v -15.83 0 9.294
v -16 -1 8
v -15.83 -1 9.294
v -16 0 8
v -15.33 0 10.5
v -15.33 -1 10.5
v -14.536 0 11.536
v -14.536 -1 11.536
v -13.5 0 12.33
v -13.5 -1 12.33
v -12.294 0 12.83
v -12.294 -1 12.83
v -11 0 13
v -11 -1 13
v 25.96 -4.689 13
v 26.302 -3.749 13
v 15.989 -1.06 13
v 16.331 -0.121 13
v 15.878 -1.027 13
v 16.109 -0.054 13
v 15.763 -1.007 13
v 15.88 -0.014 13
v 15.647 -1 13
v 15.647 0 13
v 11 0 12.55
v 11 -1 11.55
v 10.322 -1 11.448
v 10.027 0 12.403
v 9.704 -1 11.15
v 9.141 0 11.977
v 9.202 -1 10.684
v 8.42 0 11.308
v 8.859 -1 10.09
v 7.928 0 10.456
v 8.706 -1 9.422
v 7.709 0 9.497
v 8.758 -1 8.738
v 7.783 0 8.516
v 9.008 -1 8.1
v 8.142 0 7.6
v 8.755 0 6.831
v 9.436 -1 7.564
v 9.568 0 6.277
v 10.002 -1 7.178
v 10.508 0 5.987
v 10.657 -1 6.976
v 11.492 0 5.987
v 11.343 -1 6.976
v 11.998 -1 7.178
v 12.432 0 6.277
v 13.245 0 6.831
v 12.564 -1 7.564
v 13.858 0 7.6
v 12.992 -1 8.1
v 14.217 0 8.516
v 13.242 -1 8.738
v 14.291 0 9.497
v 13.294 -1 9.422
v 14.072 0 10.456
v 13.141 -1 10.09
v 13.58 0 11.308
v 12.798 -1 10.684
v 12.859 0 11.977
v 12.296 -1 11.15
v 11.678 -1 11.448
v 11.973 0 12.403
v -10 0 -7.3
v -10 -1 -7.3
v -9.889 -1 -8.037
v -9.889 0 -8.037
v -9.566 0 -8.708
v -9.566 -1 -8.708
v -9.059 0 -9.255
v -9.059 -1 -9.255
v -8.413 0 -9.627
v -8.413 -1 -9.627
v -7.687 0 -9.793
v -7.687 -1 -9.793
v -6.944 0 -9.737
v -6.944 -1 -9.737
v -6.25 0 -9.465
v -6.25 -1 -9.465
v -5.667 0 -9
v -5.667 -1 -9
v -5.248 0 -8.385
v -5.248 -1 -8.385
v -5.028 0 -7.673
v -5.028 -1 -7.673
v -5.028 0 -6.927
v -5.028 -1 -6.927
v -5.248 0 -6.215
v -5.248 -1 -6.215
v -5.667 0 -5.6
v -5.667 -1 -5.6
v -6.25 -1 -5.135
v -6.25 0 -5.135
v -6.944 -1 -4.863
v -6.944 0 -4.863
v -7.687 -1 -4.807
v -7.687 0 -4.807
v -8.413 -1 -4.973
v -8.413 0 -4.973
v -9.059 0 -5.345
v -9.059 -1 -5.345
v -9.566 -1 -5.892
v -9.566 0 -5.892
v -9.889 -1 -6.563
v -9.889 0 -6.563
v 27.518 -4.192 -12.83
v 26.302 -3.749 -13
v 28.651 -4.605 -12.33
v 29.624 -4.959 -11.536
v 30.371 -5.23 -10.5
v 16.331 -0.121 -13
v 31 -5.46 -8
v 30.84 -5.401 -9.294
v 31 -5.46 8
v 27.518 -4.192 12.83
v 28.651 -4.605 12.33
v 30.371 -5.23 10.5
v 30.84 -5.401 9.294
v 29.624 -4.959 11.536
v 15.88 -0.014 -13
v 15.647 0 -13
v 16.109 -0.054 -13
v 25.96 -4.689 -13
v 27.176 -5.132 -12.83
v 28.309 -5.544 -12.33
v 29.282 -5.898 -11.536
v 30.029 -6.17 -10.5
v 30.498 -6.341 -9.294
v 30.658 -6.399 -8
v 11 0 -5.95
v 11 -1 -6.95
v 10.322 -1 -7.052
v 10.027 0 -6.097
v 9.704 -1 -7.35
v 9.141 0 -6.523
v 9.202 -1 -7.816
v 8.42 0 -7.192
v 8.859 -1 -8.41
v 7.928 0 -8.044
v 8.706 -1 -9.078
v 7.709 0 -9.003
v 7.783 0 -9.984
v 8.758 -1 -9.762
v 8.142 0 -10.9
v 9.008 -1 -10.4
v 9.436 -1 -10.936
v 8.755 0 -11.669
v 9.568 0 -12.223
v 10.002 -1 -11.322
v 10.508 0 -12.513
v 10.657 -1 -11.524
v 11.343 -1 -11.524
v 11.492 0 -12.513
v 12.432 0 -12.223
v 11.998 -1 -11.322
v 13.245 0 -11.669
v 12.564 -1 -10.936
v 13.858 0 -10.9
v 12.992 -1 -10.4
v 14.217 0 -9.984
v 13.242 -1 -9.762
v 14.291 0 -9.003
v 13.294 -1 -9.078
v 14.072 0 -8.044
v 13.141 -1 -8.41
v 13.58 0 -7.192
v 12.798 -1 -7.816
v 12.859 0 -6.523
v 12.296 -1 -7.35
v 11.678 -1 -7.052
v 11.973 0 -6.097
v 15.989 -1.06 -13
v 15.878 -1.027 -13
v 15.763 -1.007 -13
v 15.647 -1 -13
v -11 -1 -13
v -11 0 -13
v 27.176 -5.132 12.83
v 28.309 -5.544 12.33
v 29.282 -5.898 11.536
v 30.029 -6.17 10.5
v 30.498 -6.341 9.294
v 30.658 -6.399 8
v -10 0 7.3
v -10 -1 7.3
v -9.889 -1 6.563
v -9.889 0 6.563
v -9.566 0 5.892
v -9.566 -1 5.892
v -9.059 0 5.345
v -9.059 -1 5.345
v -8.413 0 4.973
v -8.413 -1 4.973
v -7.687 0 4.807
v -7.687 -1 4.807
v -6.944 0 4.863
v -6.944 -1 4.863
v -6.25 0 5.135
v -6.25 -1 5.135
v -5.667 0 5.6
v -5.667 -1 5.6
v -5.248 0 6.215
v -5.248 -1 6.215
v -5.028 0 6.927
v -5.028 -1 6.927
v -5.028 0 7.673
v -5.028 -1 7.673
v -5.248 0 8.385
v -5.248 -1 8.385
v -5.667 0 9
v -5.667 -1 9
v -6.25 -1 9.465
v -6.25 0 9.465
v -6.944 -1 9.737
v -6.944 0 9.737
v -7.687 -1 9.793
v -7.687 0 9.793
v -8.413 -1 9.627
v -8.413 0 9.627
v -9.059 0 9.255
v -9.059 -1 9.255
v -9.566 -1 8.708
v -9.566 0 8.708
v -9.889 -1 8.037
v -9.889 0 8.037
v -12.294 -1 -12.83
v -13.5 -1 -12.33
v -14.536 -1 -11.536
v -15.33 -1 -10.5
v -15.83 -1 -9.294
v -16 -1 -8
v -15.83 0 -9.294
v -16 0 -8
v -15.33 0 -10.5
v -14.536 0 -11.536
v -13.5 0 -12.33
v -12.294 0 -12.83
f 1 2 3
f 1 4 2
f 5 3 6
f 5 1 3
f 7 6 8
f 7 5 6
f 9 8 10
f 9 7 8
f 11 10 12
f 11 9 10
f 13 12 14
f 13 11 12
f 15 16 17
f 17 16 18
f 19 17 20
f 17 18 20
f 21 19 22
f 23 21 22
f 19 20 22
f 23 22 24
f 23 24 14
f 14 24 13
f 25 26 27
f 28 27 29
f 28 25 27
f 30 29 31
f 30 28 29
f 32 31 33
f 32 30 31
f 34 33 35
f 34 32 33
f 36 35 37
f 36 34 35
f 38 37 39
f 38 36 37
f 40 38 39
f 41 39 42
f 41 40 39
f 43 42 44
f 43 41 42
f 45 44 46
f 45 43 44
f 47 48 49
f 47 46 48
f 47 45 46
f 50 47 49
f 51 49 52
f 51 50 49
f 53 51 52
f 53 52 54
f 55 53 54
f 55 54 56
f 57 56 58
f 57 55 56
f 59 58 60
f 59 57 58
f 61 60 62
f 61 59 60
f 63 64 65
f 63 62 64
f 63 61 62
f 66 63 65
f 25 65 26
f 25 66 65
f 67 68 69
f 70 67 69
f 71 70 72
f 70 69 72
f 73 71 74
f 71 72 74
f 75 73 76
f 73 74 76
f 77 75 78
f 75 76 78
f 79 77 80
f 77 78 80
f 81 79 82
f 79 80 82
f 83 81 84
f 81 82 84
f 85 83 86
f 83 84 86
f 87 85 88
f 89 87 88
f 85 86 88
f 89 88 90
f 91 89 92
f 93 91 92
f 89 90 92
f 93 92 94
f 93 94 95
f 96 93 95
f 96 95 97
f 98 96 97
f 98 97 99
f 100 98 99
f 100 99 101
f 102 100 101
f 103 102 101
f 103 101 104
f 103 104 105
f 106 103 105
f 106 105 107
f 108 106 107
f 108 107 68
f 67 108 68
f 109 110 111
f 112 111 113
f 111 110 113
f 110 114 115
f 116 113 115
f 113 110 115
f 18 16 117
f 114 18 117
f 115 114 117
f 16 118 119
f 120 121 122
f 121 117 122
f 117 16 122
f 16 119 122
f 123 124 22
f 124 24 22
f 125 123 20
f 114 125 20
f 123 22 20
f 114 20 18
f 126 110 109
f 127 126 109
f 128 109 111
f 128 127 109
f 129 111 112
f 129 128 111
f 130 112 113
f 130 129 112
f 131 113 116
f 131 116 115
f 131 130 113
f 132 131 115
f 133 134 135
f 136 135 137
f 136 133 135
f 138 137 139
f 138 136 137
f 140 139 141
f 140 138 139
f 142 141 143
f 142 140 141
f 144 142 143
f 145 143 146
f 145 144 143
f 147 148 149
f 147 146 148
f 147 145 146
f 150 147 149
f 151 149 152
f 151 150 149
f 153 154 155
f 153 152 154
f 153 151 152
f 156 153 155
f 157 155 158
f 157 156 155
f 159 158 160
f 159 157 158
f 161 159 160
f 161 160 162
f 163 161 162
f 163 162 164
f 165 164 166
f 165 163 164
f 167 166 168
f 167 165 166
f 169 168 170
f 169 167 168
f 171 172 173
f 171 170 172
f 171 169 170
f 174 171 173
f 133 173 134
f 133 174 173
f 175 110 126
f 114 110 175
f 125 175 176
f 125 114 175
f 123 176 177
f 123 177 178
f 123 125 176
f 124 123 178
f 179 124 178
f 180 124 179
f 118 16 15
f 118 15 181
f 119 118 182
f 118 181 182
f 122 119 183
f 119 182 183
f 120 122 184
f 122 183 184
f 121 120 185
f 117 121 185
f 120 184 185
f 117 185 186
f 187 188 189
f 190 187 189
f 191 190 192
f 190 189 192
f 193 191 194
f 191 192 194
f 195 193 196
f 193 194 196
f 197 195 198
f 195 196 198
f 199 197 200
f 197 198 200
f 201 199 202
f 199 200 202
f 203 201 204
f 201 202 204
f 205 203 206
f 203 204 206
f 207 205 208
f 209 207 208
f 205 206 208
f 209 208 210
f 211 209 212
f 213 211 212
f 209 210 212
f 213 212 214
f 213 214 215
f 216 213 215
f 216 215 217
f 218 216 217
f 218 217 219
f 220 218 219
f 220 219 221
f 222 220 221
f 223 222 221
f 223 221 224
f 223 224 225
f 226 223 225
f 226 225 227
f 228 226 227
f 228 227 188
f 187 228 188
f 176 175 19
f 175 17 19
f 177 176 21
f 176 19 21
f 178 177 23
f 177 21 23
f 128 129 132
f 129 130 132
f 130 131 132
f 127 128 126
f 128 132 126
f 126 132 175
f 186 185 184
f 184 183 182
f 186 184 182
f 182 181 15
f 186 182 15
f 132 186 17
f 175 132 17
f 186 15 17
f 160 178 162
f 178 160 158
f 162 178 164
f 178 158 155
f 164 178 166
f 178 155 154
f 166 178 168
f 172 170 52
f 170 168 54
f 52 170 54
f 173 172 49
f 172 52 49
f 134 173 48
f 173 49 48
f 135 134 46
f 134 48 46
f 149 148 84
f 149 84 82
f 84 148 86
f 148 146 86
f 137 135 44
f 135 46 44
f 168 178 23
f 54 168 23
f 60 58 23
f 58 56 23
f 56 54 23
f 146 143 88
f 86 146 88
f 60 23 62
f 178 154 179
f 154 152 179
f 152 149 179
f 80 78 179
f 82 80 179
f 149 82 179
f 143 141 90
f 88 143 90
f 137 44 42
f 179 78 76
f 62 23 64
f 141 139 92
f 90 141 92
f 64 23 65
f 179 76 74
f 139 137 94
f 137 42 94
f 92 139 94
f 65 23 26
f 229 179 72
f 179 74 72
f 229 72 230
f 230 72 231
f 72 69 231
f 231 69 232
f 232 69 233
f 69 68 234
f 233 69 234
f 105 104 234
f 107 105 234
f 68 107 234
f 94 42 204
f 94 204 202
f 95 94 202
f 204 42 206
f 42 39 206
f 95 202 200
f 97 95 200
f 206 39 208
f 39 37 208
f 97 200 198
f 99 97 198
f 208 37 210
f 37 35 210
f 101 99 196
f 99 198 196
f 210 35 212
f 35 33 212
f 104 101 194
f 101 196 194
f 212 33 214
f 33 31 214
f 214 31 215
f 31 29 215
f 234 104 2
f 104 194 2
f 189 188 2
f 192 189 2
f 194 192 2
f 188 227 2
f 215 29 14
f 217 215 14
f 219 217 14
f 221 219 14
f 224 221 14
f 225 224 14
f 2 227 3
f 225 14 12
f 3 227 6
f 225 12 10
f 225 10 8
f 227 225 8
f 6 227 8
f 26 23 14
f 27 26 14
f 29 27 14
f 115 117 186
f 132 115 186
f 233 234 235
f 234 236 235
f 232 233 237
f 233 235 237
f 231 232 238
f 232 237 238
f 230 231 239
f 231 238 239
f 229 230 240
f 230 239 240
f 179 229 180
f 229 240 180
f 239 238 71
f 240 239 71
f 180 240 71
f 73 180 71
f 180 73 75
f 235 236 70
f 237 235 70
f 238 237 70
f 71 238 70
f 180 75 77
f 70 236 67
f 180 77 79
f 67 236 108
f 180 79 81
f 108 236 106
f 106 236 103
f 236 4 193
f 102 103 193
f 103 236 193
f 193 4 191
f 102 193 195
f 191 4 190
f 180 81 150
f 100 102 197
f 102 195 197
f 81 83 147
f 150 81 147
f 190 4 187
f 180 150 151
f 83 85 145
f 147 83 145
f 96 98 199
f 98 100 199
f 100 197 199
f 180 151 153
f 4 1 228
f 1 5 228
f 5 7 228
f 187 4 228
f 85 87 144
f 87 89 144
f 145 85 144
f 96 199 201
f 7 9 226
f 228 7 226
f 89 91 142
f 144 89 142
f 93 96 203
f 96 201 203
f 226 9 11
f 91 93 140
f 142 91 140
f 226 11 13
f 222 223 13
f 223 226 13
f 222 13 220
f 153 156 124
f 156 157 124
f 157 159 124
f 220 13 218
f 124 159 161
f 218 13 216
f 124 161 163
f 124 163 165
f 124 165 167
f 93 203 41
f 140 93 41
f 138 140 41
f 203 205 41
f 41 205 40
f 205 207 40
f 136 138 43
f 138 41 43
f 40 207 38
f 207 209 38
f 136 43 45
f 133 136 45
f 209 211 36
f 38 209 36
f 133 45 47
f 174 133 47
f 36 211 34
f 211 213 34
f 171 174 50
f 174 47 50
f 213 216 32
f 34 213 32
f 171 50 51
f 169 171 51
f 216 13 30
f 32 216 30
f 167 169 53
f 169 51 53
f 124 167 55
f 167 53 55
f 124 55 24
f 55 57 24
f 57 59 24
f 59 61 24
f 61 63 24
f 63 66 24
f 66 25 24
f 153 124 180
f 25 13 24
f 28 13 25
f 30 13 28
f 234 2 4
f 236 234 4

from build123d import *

# Parameters (mm, degrees)
SM_BASE_FLANGE_1_DEPTH   = 13
HOLE_WIZARD_1_AT_2_COUNT = 2
HOLE_WIZARD_1_AT_2_PITCH = 18.5
HOLE_WIZARD_5_0_5_1_D    = 5
FILLET_1_R               = 5


# Sheet-metal steps are written as plain solids
with BuildPart() as part:
    # Sketch 1 → 基体-法兰1 (new, symmetric)
    with BuildSketch(Plane.XY):
        with BuildLine():
            Line((-16, 0), (15.647346039, 0))
            ThreePointArc((15.647346039, 0), (15.994642394, -0.030384494), (16.331386325, -0.120614758))
            Line((16.331386325, -0.120614758), (31, -5.459553514))
            Line((31, -5.459553514), (30.657979857, -6.399246135))
            Line((30.657979857, -6.399246135), (15.989366182, -1.060307379))
            ThreePointArc((15.989366182, -1.060307379), (15.820994216, -1.015192247), (15.647346039, -1))
            Line((15.647346039, -1), (-16, -1))
            Line((-16, -1), (-16, 0))
        make_face()
    extrude(amount=SM_BASE_FLANGE_1_DEPTH, both=True)

    # 草图6 → 打孔尺寸(%根据十字)槽沉头木螺钉的类型1 (revolve, cut)
    with BuildSketch(Plane(origin=(11, 0, 9.25), x_dir=(0, 0, 1), z_dir=(1, 0, 0))):
        Polygon((0, 0), (0, 1), (1.7, 1), (1.7, 1.6), (3.3, 0), align=None)
    hole_wizard_1 = revolve(axis=Axis((11, 6.35, 9.25), (0, -1, 0)), mode=Mode.SUBTRACT)

    # 打孔尺寸(%根据十字)槽沉头木螺钉的类型1 at 2: 打孔尺寸(%根据十字)槽沉头木螺钉的类型1 ×2
    with Locations(*[(0, 0, -i * HOLE_WIZARD_1_AT_2_PITCH) for i in range(1, HOLE_WIZARD_1_AT_2_COUNT)]):
        add(hole_wizard_1, mode=Mode.SUBTRACT)

    # Ø5.0 (5) 直径孔1 (through all)
    with Locations(Plane(origin=(0, 0, 0), x_dir=(1, 0, 0), z_dir=(0, 1, 0))):
        with Locations((-7.5, -7.3), (-7.5, 7.3)):
            Hole(HOLE_WIZARD_5_0_5_1_D / 2)

    # 圆角1
    fillet_1_edges = [part.edges().sort_by_distance(p)[0] for p in [
        (-16, -0.5, 13),
        (30.828989928, -5.929399824, 13),
        (-16, -0.5, -13),
        (30.828989928, -5.929399824, -13),
    ]]
    fillet(fillet_1_edges, radius=FILLET_1_R)


solid = part.part
